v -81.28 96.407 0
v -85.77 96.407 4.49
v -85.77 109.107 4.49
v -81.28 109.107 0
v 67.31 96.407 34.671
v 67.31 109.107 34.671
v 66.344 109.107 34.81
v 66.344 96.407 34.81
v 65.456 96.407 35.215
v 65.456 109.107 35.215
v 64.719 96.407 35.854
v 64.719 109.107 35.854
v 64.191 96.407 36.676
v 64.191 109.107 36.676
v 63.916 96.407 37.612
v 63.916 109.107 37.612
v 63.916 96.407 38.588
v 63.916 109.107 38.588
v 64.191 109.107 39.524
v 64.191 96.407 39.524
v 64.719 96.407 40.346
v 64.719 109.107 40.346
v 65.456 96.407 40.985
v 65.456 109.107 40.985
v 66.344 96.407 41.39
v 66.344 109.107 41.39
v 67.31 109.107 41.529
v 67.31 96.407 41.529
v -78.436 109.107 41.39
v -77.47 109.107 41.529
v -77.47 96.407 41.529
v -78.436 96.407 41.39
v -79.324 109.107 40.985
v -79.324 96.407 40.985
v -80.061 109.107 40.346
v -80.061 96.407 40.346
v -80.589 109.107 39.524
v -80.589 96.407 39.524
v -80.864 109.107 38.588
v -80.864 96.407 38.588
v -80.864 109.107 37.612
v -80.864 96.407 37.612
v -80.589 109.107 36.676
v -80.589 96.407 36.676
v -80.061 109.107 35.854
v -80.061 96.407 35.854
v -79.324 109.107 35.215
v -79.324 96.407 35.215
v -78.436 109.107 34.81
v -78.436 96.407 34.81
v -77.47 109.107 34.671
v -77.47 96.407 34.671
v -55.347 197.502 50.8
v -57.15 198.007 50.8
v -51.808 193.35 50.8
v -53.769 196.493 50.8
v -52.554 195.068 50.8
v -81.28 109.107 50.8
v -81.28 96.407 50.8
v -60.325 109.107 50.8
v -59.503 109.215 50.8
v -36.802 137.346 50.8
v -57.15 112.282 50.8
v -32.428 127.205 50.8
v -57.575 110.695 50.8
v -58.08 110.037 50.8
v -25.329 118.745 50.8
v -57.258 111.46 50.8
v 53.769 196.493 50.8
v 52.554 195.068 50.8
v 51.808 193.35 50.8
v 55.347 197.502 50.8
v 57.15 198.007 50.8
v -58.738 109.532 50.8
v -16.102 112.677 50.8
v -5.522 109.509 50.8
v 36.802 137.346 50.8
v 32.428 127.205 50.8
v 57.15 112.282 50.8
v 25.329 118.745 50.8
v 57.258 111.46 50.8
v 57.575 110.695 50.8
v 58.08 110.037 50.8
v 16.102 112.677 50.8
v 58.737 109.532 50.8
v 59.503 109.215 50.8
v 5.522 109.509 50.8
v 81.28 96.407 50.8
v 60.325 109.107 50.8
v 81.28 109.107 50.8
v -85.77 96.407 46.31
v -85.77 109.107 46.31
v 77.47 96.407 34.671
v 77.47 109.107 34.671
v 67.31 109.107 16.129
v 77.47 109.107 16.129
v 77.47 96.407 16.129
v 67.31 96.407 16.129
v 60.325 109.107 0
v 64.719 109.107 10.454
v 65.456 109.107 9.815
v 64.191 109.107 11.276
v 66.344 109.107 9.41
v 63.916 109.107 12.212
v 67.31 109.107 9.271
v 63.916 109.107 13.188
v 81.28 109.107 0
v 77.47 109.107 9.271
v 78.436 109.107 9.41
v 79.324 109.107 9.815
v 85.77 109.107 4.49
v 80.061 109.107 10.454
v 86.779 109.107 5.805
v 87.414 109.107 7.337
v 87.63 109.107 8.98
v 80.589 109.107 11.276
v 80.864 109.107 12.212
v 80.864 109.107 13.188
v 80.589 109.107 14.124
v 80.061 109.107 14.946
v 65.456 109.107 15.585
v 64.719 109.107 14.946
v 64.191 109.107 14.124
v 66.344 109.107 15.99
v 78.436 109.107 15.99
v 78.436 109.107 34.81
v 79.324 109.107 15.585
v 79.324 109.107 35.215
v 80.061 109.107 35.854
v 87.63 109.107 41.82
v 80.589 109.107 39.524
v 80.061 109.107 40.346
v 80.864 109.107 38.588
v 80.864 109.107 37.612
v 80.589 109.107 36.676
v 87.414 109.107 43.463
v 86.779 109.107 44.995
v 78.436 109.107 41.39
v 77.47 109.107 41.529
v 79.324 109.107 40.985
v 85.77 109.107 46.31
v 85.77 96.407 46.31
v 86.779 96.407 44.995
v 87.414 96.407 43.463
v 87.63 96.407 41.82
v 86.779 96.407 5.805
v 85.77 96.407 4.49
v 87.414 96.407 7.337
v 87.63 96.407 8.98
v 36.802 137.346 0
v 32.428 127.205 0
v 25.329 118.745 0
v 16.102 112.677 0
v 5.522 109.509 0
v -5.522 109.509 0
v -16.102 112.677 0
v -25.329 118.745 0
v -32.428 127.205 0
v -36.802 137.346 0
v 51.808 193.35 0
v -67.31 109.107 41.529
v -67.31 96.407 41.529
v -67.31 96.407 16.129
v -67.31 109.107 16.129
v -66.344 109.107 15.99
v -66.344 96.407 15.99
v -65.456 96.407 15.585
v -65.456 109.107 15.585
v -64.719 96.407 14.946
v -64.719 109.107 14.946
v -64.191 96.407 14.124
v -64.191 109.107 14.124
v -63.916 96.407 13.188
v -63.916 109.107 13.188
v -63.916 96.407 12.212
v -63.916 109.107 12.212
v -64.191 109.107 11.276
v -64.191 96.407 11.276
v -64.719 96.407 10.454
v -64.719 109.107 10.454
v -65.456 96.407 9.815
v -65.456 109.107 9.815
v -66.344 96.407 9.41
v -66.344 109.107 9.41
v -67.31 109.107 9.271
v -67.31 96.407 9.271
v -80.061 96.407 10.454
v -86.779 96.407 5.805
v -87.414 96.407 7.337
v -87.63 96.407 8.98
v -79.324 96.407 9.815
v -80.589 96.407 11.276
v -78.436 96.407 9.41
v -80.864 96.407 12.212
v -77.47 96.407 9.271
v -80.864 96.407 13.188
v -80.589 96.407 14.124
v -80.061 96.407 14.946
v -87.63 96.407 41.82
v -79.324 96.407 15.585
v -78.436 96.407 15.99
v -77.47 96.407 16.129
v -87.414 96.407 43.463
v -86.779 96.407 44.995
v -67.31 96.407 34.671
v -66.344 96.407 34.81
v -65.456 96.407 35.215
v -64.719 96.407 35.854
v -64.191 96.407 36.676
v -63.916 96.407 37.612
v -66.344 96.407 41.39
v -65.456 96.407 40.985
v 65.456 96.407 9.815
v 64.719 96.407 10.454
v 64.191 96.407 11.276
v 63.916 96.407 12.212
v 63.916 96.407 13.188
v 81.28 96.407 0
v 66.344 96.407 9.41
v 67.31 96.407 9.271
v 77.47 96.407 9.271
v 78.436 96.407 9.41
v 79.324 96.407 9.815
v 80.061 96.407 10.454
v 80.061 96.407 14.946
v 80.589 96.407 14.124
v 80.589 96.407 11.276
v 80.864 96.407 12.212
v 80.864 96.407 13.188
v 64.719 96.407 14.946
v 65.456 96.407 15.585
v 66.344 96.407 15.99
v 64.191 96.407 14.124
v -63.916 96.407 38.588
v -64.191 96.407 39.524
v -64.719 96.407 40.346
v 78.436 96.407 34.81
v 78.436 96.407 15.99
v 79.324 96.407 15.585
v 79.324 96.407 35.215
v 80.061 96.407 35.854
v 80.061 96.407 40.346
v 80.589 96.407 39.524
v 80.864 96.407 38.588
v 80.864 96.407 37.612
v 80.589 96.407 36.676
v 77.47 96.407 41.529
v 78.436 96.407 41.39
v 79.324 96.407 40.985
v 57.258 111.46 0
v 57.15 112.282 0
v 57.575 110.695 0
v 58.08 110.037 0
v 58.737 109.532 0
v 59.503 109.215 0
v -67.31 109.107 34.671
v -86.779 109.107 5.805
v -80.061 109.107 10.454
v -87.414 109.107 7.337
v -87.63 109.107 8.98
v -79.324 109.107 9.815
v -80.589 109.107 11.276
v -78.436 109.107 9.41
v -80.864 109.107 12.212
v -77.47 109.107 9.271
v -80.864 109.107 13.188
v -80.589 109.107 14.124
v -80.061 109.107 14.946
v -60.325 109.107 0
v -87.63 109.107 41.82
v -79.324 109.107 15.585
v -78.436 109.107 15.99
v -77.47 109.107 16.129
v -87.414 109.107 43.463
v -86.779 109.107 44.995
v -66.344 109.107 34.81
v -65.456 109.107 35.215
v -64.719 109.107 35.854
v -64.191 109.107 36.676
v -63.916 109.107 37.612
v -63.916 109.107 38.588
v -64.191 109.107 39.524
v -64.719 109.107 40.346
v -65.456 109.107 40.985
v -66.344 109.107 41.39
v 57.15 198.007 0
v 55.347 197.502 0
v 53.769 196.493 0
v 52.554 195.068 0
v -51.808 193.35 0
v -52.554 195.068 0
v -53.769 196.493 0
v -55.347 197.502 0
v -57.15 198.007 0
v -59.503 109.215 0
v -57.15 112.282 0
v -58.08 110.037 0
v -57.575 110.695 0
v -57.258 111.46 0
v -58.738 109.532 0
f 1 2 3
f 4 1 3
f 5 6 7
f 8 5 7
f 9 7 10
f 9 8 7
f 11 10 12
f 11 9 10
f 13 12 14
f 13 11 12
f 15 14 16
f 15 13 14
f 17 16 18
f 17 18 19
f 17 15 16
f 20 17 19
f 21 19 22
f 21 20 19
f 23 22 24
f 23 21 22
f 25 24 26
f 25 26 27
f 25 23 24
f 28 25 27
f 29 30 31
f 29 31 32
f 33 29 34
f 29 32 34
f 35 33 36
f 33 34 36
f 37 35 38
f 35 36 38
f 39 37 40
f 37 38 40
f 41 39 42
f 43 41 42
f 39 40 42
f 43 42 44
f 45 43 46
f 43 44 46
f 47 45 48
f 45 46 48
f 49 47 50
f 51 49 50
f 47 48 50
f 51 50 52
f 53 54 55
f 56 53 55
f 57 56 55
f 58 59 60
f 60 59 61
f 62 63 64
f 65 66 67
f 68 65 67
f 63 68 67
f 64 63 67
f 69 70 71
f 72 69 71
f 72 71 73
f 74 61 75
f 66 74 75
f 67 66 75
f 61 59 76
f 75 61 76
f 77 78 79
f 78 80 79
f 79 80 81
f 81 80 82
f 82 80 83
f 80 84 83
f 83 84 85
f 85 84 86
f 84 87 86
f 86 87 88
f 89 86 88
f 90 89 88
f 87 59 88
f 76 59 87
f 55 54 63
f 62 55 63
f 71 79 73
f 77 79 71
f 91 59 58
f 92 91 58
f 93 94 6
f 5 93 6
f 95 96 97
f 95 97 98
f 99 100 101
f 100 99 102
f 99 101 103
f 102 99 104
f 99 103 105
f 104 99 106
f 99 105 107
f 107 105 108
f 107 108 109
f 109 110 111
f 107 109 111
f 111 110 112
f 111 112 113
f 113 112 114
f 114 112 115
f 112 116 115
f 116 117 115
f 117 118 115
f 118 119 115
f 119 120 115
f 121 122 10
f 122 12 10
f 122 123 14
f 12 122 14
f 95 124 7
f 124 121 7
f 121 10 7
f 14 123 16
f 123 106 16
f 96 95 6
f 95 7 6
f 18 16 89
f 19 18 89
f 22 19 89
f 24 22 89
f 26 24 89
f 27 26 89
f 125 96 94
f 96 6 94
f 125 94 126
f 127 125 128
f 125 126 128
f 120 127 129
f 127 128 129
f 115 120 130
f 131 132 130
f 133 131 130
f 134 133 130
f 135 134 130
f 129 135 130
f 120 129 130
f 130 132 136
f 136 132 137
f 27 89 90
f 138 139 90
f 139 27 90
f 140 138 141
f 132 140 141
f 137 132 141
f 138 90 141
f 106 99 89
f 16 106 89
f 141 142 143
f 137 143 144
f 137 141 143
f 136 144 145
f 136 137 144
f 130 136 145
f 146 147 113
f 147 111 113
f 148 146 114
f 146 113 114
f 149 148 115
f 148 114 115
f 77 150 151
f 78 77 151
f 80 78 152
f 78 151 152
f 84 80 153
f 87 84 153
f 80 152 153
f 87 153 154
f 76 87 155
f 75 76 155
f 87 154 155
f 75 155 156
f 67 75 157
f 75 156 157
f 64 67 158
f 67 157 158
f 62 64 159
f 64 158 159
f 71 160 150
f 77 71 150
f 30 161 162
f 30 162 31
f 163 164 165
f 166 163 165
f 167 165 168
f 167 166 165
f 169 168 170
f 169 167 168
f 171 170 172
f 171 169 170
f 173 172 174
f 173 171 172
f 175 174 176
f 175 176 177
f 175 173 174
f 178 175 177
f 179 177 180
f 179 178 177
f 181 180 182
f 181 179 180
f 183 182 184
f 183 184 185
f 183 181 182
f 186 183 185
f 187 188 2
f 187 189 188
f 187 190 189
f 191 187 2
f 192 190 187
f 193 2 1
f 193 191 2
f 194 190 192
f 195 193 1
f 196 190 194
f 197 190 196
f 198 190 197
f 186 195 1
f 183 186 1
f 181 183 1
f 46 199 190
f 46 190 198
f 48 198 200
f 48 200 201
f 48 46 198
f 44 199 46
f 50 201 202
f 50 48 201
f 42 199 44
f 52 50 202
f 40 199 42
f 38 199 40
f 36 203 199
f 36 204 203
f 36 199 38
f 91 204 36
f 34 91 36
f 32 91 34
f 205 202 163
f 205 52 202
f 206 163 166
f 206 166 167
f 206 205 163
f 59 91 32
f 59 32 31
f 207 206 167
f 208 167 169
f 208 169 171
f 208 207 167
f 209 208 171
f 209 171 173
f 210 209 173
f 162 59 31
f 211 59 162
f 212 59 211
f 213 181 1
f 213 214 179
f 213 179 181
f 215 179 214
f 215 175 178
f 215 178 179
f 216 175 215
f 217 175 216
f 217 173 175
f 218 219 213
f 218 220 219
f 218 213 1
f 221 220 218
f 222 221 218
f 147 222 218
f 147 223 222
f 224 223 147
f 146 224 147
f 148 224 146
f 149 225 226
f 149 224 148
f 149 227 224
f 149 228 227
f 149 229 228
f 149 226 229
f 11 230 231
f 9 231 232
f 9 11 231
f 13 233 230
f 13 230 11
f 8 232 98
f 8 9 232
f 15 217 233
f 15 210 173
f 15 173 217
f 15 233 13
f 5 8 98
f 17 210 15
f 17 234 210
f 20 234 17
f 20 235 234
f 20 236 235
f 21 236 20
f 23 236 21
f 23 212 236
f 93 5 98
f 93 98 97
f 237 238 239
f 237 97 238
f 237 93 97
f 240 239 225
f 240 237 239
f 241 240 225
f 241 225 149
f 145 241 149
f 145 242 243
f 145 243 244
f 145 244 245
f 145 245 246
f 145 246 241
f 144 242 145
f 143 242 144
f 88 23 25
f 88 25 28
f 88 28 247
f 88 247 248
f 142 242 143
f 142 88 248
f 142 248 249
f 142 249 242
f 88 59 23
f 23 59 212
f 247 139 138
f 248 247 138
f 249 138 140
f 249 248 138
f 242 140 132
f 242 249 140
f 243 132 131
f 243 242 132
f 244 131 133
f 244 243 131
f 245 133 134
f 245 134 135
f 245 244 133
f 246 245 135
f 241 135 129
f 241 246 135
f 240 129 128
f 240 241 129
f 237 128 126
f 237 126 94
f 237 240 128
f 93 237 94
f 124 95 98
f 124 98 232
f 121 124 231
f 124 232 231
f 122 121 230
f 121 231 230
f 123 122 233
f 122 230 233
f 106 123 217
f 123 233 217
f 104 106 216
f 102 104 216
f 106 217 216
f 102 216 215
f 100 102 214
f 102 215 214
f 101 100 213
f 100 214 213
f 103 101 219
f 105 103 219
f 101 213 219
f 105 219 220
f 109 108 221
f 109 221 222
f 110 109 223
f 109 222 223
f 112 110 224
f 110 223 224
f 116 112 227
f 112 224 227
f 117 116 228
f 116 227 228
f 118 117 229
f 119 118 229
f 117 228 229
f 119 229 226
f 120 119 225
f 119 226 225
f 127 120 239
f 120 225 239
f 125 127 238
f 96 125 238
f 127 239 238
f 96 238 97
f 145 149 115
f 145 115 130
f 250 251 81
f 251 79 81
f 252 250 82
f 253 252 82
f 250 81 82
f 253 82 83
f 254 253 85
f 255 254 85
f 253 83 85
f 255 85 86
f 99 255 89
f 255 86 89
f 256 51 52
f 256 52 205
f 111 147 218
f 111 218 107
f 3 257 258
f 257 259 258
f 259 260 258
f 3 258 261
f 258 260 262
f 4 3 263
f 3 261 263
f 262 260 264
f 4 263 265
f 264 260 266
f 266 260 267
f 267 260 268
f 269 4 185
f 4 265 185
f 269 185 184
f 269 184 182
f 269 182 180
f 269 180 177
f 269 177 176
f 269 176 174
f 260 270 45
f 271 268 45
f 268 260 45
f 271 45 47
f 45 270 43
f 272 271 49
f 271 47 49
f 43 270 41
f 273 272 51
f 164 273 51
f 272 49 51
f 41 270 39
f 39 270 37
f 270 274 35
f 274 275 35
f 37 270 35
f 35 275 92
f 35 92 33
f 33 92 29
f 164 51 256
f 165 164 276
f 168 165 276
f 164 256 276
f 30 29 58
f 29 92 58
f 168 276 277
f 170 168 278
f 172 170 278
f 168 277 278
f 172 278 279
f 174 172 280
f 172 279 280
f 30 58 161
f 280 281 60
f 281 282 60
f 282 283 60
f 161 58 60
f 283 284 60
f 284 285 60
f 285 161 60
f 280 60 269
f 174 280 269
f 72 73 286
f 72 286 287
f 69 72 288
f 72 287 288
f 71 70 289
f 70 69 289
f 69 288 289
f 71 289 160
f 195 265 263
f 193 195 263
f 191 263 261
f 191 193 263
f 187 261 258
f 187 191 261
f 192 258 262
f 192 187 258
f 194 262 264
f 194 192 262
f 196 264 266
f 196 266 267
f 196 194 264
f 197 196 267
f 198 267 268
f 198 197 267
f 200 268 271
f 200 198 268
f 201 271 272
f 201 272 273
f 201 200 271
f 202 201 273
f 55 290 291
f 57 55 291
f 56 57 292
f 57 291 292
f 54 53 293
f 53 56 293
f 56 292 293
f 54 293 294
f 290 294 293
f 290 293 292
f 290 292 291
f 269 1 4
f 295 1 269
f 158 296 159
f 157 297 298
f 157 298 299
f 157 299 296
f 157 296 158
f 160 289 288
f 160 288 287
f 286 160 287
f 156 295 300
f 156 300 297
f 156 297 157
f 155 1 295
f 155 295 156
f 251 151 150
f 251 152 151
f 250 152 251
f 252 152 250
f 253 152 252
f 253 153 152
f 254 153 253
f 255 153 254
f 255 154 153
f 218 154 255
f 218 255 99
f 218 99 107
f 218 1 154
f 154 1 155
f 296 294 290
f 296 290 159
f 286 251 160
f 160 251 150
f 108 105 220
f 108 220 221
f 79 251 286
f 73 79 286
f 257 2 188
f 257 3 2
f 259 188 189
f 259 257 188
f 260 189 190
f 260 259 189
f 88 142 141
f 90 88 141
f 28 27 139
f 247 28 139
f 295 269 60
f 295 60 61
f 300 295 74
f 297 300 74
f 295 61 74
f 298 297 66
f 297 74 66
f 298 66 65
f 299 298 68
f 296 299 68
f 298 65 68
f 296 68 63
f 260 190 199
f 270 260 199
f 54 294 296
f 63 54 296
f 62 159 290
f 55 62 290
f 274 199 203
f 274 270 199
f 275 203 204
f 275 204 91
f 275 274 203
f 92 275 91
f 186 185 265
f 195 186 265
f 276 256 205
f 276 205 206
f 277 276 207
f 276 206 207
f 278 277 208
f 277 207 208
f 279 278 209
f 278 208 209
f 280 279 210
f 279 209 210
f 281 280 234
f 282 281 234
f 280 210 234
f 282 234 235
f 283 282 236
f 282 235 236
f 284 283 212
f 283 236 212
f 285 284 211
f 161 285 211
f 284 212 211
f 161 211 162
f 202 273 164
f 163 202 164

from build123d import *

# Parameters (mm, degrees)
BOSS_EXTRUDE1_DEPTH = 50.8
SKETCH2_W           = 30.48
SKETCH2_H           = 50.8
BOSS_EXTRUDE2_DEPTH = 12.7
FILLET1_R           = 3.175
CHAMFER1_SIZE       = 6.35
FILLET2_R           = 6.35
FILLET3_R           = 6.35


with BuildPart() as part:
    # Sketch1 → Boss-Extrude1 (new body)
    with BuildSketch(Plane.XY):
        with BuildLine():
            Line((-36.801773982, 137.346090308), (-53.055841449, 198.007095926))
            Line((-53.055841449, 198.007095926), (-57.15, 198.007095926))
            Line((-57.15, 198.007095926), (-57.15, 96.407095926))
            Line((-57.15, 96.407095926), (57.15, 96.407095926))
            Line((57.15, 96.407095926), (57.15, 198.007095926))
            Line((57.15, 198.007095926), (53.055841449, 198.007095926))
            Line((53.055841449, 198.007095926), (36.801773982, 137.346090308))
            ThreePointArc((36.801773982, 137.346090308), (0, 109.107095926), (-36.801773982, 137.346090308))
        make_face()
    extrude(amount=BOSS_EXTRUDE1_DEPTH)

    # Sketch2 → Boss-Extrude2 (add)
    # profile 1 of 2: a face of its own
    with BuildSketch(Plane.XZ.offset(-96.407095926)):
        with Locations((-72.39, 25.4)):
            Rectangle(SKETCH2_W, SKETCH2_H)
        with BuildLine():
            Line((-77.47, 16.129), (-67.31, 16.129))
            ThreePointArc((-67.31, 16.129), (-63.881, 12.7), (-67.31, 9.271))
            Line((-67.31, 9.271), (-77.47, 9.271))
            ThreePointArc((-77.47, 9.271), (-80.899, 12.7), (-77.47, 16.129))
        make_face(mode=Mode.SUBTRACT)
        with BuildLine():
            Line((-77.47, 34.671), (-67.31, 34.671))
            ThreePointArc((-67.31, 34.671), (-63.881, 38.1), (-67.31, 41.529))
            Line((-67.31, 41.529), (-77.47, 41.529))
            ThreePointArc((-77.47, 41.529), (-80.899, 38.1), (-77.47, 34.671))
        make_face(mode=Mode.SUBTRACT)
    # profile 2 of 2: a face of its own
    with BuildSketch(Plane.XZ.offset(-96.407095926)):
        with Locations((72.39, 25.4)):
            Rectangle(SKETCH2_W, SKETCH2_H)
        with BuildLine():
            Line((77.47, 34.671), (67.31, 34.671))
            ThreePointArc((67.31, 34.671), (63.881, 38.1), (67.31, 41.529))
            Line((67.31, 41.529), (77.47, 41.529))
            ThreePointArc((77.47, 41.529), (80.899, 38.1), (77.47, 34.671))
        make_face(mode=Mode.SUBTRACT)
        with BuildLine():
            Line((77.47, 16.129), (67.31, 16.129))
            ThreePointArc((67.31, 16.129), (63.881, 12.7), (67.31, 9.271))
            Line((67.31, 9.271), (77.47, 9.271))
            ThreePointArc((77.47, 9.271), (80.899, 12.7), (77.47, 16.129))
        make_face(mode=Mode.SUBTRACT)
    extrude(amount=-BOSS_EXTRUDE2_DEPTH)

    # Fillet1
    fillet1_edges = [part.edges().sort_by_distance(p)[0] for p in [
        (-57.15, 109.107095926, 25.4),
        (57.15, 109.107095926, 25.4),
    ]]
    fillet(fillet1_edges, radius=FILLET1_R)

    # Chamfer1
    chamfer1_edges = [part.edges().sort_by_distance(p)[0] for p in [
        (-87.63, 102.757095926, 0),
        (-87.63, 102.757095926, 50.8),
        (87.63, 102.757095926, 0),
        (87.63, 102.757095926, 50.8),
    ]]
    chamfer(chamfer1_edges, length=CHAMFER1_SIZE)

    # Fillet2
    fillet2_edges = [part.edges().sort_by_distance(p)[0] for p in [
        (87.63, 102.757095926, 6.35),
        (87.63, 102.757095926, 44.45),
        (-87.63, 102.757095926, 44.45),
        (-87.63, 102.757095926, 6.35),
    ]]
    fillet(fillet2_edges, radius=FILLET2_R)

    # Fillet3
    # the kernel refuses this fillet: 6.35 mm, written as the material it takes off along each edge
    with BuildSketch(Plane(origin=(53.055841449, 198.007095926, -12.053098402), x_dir=(-0.2588190451025212, -0.9659258262890681, 0), z_dir=(0, 0, 1))) as fillet3_piece_1:
        with BuildLine():
            CenterArc((4.821239361, 6.35), FILLET3_R, 202.161584325, 67.838415675)
            Line((-1.059646207, 3.954653481), (-1.177263918, 3.906746551))
            ThreePointArc((-1.177263918, 3.906746551), (-0.652495683, 1.944456722), (-0.12267258, -0.032870019))
            Line((-0.12267258, -0.032870019), (0, -0.127))
            Line((0, -0.127), (4.821239361, -0.127))
            Line((4.821239361, -0.127), (4.821239361, 0))
        make_face()
    extrude(amount=74.906196803, mode=Mode.SUBTRACT)
    with BuildSketch(Plane(origin=(-53.055841449, 198.007095926, -12.053098402), x_dir=(-1, 0, 0), z_dir=(0, 0, 1))) as fillet3_piece_2:
        with BuildLine():
            CenterArc((4.885800429, 6.30046055), FILLET3_R, 195, 67.838415675)
            Line((-1.247828568, 4.656959613), (-1.370501147, 4.624089594))
            Line((-1.370501147, 4.624089594), (-0.12267258, -0.032870019))
            Line((-0.12267258, -0.032870019), (0, -0.127))
            ThreePointArc((0, -0.127), (2.047079275, -0.127), (4.078325713, -0.126009211))
            Line((4.078325713, -0.126009211), (4.094158551, 0))
        make_face()
    extrude(amount=74.906196803, mode=Mode.SUBTRACT)


solid = part.part
